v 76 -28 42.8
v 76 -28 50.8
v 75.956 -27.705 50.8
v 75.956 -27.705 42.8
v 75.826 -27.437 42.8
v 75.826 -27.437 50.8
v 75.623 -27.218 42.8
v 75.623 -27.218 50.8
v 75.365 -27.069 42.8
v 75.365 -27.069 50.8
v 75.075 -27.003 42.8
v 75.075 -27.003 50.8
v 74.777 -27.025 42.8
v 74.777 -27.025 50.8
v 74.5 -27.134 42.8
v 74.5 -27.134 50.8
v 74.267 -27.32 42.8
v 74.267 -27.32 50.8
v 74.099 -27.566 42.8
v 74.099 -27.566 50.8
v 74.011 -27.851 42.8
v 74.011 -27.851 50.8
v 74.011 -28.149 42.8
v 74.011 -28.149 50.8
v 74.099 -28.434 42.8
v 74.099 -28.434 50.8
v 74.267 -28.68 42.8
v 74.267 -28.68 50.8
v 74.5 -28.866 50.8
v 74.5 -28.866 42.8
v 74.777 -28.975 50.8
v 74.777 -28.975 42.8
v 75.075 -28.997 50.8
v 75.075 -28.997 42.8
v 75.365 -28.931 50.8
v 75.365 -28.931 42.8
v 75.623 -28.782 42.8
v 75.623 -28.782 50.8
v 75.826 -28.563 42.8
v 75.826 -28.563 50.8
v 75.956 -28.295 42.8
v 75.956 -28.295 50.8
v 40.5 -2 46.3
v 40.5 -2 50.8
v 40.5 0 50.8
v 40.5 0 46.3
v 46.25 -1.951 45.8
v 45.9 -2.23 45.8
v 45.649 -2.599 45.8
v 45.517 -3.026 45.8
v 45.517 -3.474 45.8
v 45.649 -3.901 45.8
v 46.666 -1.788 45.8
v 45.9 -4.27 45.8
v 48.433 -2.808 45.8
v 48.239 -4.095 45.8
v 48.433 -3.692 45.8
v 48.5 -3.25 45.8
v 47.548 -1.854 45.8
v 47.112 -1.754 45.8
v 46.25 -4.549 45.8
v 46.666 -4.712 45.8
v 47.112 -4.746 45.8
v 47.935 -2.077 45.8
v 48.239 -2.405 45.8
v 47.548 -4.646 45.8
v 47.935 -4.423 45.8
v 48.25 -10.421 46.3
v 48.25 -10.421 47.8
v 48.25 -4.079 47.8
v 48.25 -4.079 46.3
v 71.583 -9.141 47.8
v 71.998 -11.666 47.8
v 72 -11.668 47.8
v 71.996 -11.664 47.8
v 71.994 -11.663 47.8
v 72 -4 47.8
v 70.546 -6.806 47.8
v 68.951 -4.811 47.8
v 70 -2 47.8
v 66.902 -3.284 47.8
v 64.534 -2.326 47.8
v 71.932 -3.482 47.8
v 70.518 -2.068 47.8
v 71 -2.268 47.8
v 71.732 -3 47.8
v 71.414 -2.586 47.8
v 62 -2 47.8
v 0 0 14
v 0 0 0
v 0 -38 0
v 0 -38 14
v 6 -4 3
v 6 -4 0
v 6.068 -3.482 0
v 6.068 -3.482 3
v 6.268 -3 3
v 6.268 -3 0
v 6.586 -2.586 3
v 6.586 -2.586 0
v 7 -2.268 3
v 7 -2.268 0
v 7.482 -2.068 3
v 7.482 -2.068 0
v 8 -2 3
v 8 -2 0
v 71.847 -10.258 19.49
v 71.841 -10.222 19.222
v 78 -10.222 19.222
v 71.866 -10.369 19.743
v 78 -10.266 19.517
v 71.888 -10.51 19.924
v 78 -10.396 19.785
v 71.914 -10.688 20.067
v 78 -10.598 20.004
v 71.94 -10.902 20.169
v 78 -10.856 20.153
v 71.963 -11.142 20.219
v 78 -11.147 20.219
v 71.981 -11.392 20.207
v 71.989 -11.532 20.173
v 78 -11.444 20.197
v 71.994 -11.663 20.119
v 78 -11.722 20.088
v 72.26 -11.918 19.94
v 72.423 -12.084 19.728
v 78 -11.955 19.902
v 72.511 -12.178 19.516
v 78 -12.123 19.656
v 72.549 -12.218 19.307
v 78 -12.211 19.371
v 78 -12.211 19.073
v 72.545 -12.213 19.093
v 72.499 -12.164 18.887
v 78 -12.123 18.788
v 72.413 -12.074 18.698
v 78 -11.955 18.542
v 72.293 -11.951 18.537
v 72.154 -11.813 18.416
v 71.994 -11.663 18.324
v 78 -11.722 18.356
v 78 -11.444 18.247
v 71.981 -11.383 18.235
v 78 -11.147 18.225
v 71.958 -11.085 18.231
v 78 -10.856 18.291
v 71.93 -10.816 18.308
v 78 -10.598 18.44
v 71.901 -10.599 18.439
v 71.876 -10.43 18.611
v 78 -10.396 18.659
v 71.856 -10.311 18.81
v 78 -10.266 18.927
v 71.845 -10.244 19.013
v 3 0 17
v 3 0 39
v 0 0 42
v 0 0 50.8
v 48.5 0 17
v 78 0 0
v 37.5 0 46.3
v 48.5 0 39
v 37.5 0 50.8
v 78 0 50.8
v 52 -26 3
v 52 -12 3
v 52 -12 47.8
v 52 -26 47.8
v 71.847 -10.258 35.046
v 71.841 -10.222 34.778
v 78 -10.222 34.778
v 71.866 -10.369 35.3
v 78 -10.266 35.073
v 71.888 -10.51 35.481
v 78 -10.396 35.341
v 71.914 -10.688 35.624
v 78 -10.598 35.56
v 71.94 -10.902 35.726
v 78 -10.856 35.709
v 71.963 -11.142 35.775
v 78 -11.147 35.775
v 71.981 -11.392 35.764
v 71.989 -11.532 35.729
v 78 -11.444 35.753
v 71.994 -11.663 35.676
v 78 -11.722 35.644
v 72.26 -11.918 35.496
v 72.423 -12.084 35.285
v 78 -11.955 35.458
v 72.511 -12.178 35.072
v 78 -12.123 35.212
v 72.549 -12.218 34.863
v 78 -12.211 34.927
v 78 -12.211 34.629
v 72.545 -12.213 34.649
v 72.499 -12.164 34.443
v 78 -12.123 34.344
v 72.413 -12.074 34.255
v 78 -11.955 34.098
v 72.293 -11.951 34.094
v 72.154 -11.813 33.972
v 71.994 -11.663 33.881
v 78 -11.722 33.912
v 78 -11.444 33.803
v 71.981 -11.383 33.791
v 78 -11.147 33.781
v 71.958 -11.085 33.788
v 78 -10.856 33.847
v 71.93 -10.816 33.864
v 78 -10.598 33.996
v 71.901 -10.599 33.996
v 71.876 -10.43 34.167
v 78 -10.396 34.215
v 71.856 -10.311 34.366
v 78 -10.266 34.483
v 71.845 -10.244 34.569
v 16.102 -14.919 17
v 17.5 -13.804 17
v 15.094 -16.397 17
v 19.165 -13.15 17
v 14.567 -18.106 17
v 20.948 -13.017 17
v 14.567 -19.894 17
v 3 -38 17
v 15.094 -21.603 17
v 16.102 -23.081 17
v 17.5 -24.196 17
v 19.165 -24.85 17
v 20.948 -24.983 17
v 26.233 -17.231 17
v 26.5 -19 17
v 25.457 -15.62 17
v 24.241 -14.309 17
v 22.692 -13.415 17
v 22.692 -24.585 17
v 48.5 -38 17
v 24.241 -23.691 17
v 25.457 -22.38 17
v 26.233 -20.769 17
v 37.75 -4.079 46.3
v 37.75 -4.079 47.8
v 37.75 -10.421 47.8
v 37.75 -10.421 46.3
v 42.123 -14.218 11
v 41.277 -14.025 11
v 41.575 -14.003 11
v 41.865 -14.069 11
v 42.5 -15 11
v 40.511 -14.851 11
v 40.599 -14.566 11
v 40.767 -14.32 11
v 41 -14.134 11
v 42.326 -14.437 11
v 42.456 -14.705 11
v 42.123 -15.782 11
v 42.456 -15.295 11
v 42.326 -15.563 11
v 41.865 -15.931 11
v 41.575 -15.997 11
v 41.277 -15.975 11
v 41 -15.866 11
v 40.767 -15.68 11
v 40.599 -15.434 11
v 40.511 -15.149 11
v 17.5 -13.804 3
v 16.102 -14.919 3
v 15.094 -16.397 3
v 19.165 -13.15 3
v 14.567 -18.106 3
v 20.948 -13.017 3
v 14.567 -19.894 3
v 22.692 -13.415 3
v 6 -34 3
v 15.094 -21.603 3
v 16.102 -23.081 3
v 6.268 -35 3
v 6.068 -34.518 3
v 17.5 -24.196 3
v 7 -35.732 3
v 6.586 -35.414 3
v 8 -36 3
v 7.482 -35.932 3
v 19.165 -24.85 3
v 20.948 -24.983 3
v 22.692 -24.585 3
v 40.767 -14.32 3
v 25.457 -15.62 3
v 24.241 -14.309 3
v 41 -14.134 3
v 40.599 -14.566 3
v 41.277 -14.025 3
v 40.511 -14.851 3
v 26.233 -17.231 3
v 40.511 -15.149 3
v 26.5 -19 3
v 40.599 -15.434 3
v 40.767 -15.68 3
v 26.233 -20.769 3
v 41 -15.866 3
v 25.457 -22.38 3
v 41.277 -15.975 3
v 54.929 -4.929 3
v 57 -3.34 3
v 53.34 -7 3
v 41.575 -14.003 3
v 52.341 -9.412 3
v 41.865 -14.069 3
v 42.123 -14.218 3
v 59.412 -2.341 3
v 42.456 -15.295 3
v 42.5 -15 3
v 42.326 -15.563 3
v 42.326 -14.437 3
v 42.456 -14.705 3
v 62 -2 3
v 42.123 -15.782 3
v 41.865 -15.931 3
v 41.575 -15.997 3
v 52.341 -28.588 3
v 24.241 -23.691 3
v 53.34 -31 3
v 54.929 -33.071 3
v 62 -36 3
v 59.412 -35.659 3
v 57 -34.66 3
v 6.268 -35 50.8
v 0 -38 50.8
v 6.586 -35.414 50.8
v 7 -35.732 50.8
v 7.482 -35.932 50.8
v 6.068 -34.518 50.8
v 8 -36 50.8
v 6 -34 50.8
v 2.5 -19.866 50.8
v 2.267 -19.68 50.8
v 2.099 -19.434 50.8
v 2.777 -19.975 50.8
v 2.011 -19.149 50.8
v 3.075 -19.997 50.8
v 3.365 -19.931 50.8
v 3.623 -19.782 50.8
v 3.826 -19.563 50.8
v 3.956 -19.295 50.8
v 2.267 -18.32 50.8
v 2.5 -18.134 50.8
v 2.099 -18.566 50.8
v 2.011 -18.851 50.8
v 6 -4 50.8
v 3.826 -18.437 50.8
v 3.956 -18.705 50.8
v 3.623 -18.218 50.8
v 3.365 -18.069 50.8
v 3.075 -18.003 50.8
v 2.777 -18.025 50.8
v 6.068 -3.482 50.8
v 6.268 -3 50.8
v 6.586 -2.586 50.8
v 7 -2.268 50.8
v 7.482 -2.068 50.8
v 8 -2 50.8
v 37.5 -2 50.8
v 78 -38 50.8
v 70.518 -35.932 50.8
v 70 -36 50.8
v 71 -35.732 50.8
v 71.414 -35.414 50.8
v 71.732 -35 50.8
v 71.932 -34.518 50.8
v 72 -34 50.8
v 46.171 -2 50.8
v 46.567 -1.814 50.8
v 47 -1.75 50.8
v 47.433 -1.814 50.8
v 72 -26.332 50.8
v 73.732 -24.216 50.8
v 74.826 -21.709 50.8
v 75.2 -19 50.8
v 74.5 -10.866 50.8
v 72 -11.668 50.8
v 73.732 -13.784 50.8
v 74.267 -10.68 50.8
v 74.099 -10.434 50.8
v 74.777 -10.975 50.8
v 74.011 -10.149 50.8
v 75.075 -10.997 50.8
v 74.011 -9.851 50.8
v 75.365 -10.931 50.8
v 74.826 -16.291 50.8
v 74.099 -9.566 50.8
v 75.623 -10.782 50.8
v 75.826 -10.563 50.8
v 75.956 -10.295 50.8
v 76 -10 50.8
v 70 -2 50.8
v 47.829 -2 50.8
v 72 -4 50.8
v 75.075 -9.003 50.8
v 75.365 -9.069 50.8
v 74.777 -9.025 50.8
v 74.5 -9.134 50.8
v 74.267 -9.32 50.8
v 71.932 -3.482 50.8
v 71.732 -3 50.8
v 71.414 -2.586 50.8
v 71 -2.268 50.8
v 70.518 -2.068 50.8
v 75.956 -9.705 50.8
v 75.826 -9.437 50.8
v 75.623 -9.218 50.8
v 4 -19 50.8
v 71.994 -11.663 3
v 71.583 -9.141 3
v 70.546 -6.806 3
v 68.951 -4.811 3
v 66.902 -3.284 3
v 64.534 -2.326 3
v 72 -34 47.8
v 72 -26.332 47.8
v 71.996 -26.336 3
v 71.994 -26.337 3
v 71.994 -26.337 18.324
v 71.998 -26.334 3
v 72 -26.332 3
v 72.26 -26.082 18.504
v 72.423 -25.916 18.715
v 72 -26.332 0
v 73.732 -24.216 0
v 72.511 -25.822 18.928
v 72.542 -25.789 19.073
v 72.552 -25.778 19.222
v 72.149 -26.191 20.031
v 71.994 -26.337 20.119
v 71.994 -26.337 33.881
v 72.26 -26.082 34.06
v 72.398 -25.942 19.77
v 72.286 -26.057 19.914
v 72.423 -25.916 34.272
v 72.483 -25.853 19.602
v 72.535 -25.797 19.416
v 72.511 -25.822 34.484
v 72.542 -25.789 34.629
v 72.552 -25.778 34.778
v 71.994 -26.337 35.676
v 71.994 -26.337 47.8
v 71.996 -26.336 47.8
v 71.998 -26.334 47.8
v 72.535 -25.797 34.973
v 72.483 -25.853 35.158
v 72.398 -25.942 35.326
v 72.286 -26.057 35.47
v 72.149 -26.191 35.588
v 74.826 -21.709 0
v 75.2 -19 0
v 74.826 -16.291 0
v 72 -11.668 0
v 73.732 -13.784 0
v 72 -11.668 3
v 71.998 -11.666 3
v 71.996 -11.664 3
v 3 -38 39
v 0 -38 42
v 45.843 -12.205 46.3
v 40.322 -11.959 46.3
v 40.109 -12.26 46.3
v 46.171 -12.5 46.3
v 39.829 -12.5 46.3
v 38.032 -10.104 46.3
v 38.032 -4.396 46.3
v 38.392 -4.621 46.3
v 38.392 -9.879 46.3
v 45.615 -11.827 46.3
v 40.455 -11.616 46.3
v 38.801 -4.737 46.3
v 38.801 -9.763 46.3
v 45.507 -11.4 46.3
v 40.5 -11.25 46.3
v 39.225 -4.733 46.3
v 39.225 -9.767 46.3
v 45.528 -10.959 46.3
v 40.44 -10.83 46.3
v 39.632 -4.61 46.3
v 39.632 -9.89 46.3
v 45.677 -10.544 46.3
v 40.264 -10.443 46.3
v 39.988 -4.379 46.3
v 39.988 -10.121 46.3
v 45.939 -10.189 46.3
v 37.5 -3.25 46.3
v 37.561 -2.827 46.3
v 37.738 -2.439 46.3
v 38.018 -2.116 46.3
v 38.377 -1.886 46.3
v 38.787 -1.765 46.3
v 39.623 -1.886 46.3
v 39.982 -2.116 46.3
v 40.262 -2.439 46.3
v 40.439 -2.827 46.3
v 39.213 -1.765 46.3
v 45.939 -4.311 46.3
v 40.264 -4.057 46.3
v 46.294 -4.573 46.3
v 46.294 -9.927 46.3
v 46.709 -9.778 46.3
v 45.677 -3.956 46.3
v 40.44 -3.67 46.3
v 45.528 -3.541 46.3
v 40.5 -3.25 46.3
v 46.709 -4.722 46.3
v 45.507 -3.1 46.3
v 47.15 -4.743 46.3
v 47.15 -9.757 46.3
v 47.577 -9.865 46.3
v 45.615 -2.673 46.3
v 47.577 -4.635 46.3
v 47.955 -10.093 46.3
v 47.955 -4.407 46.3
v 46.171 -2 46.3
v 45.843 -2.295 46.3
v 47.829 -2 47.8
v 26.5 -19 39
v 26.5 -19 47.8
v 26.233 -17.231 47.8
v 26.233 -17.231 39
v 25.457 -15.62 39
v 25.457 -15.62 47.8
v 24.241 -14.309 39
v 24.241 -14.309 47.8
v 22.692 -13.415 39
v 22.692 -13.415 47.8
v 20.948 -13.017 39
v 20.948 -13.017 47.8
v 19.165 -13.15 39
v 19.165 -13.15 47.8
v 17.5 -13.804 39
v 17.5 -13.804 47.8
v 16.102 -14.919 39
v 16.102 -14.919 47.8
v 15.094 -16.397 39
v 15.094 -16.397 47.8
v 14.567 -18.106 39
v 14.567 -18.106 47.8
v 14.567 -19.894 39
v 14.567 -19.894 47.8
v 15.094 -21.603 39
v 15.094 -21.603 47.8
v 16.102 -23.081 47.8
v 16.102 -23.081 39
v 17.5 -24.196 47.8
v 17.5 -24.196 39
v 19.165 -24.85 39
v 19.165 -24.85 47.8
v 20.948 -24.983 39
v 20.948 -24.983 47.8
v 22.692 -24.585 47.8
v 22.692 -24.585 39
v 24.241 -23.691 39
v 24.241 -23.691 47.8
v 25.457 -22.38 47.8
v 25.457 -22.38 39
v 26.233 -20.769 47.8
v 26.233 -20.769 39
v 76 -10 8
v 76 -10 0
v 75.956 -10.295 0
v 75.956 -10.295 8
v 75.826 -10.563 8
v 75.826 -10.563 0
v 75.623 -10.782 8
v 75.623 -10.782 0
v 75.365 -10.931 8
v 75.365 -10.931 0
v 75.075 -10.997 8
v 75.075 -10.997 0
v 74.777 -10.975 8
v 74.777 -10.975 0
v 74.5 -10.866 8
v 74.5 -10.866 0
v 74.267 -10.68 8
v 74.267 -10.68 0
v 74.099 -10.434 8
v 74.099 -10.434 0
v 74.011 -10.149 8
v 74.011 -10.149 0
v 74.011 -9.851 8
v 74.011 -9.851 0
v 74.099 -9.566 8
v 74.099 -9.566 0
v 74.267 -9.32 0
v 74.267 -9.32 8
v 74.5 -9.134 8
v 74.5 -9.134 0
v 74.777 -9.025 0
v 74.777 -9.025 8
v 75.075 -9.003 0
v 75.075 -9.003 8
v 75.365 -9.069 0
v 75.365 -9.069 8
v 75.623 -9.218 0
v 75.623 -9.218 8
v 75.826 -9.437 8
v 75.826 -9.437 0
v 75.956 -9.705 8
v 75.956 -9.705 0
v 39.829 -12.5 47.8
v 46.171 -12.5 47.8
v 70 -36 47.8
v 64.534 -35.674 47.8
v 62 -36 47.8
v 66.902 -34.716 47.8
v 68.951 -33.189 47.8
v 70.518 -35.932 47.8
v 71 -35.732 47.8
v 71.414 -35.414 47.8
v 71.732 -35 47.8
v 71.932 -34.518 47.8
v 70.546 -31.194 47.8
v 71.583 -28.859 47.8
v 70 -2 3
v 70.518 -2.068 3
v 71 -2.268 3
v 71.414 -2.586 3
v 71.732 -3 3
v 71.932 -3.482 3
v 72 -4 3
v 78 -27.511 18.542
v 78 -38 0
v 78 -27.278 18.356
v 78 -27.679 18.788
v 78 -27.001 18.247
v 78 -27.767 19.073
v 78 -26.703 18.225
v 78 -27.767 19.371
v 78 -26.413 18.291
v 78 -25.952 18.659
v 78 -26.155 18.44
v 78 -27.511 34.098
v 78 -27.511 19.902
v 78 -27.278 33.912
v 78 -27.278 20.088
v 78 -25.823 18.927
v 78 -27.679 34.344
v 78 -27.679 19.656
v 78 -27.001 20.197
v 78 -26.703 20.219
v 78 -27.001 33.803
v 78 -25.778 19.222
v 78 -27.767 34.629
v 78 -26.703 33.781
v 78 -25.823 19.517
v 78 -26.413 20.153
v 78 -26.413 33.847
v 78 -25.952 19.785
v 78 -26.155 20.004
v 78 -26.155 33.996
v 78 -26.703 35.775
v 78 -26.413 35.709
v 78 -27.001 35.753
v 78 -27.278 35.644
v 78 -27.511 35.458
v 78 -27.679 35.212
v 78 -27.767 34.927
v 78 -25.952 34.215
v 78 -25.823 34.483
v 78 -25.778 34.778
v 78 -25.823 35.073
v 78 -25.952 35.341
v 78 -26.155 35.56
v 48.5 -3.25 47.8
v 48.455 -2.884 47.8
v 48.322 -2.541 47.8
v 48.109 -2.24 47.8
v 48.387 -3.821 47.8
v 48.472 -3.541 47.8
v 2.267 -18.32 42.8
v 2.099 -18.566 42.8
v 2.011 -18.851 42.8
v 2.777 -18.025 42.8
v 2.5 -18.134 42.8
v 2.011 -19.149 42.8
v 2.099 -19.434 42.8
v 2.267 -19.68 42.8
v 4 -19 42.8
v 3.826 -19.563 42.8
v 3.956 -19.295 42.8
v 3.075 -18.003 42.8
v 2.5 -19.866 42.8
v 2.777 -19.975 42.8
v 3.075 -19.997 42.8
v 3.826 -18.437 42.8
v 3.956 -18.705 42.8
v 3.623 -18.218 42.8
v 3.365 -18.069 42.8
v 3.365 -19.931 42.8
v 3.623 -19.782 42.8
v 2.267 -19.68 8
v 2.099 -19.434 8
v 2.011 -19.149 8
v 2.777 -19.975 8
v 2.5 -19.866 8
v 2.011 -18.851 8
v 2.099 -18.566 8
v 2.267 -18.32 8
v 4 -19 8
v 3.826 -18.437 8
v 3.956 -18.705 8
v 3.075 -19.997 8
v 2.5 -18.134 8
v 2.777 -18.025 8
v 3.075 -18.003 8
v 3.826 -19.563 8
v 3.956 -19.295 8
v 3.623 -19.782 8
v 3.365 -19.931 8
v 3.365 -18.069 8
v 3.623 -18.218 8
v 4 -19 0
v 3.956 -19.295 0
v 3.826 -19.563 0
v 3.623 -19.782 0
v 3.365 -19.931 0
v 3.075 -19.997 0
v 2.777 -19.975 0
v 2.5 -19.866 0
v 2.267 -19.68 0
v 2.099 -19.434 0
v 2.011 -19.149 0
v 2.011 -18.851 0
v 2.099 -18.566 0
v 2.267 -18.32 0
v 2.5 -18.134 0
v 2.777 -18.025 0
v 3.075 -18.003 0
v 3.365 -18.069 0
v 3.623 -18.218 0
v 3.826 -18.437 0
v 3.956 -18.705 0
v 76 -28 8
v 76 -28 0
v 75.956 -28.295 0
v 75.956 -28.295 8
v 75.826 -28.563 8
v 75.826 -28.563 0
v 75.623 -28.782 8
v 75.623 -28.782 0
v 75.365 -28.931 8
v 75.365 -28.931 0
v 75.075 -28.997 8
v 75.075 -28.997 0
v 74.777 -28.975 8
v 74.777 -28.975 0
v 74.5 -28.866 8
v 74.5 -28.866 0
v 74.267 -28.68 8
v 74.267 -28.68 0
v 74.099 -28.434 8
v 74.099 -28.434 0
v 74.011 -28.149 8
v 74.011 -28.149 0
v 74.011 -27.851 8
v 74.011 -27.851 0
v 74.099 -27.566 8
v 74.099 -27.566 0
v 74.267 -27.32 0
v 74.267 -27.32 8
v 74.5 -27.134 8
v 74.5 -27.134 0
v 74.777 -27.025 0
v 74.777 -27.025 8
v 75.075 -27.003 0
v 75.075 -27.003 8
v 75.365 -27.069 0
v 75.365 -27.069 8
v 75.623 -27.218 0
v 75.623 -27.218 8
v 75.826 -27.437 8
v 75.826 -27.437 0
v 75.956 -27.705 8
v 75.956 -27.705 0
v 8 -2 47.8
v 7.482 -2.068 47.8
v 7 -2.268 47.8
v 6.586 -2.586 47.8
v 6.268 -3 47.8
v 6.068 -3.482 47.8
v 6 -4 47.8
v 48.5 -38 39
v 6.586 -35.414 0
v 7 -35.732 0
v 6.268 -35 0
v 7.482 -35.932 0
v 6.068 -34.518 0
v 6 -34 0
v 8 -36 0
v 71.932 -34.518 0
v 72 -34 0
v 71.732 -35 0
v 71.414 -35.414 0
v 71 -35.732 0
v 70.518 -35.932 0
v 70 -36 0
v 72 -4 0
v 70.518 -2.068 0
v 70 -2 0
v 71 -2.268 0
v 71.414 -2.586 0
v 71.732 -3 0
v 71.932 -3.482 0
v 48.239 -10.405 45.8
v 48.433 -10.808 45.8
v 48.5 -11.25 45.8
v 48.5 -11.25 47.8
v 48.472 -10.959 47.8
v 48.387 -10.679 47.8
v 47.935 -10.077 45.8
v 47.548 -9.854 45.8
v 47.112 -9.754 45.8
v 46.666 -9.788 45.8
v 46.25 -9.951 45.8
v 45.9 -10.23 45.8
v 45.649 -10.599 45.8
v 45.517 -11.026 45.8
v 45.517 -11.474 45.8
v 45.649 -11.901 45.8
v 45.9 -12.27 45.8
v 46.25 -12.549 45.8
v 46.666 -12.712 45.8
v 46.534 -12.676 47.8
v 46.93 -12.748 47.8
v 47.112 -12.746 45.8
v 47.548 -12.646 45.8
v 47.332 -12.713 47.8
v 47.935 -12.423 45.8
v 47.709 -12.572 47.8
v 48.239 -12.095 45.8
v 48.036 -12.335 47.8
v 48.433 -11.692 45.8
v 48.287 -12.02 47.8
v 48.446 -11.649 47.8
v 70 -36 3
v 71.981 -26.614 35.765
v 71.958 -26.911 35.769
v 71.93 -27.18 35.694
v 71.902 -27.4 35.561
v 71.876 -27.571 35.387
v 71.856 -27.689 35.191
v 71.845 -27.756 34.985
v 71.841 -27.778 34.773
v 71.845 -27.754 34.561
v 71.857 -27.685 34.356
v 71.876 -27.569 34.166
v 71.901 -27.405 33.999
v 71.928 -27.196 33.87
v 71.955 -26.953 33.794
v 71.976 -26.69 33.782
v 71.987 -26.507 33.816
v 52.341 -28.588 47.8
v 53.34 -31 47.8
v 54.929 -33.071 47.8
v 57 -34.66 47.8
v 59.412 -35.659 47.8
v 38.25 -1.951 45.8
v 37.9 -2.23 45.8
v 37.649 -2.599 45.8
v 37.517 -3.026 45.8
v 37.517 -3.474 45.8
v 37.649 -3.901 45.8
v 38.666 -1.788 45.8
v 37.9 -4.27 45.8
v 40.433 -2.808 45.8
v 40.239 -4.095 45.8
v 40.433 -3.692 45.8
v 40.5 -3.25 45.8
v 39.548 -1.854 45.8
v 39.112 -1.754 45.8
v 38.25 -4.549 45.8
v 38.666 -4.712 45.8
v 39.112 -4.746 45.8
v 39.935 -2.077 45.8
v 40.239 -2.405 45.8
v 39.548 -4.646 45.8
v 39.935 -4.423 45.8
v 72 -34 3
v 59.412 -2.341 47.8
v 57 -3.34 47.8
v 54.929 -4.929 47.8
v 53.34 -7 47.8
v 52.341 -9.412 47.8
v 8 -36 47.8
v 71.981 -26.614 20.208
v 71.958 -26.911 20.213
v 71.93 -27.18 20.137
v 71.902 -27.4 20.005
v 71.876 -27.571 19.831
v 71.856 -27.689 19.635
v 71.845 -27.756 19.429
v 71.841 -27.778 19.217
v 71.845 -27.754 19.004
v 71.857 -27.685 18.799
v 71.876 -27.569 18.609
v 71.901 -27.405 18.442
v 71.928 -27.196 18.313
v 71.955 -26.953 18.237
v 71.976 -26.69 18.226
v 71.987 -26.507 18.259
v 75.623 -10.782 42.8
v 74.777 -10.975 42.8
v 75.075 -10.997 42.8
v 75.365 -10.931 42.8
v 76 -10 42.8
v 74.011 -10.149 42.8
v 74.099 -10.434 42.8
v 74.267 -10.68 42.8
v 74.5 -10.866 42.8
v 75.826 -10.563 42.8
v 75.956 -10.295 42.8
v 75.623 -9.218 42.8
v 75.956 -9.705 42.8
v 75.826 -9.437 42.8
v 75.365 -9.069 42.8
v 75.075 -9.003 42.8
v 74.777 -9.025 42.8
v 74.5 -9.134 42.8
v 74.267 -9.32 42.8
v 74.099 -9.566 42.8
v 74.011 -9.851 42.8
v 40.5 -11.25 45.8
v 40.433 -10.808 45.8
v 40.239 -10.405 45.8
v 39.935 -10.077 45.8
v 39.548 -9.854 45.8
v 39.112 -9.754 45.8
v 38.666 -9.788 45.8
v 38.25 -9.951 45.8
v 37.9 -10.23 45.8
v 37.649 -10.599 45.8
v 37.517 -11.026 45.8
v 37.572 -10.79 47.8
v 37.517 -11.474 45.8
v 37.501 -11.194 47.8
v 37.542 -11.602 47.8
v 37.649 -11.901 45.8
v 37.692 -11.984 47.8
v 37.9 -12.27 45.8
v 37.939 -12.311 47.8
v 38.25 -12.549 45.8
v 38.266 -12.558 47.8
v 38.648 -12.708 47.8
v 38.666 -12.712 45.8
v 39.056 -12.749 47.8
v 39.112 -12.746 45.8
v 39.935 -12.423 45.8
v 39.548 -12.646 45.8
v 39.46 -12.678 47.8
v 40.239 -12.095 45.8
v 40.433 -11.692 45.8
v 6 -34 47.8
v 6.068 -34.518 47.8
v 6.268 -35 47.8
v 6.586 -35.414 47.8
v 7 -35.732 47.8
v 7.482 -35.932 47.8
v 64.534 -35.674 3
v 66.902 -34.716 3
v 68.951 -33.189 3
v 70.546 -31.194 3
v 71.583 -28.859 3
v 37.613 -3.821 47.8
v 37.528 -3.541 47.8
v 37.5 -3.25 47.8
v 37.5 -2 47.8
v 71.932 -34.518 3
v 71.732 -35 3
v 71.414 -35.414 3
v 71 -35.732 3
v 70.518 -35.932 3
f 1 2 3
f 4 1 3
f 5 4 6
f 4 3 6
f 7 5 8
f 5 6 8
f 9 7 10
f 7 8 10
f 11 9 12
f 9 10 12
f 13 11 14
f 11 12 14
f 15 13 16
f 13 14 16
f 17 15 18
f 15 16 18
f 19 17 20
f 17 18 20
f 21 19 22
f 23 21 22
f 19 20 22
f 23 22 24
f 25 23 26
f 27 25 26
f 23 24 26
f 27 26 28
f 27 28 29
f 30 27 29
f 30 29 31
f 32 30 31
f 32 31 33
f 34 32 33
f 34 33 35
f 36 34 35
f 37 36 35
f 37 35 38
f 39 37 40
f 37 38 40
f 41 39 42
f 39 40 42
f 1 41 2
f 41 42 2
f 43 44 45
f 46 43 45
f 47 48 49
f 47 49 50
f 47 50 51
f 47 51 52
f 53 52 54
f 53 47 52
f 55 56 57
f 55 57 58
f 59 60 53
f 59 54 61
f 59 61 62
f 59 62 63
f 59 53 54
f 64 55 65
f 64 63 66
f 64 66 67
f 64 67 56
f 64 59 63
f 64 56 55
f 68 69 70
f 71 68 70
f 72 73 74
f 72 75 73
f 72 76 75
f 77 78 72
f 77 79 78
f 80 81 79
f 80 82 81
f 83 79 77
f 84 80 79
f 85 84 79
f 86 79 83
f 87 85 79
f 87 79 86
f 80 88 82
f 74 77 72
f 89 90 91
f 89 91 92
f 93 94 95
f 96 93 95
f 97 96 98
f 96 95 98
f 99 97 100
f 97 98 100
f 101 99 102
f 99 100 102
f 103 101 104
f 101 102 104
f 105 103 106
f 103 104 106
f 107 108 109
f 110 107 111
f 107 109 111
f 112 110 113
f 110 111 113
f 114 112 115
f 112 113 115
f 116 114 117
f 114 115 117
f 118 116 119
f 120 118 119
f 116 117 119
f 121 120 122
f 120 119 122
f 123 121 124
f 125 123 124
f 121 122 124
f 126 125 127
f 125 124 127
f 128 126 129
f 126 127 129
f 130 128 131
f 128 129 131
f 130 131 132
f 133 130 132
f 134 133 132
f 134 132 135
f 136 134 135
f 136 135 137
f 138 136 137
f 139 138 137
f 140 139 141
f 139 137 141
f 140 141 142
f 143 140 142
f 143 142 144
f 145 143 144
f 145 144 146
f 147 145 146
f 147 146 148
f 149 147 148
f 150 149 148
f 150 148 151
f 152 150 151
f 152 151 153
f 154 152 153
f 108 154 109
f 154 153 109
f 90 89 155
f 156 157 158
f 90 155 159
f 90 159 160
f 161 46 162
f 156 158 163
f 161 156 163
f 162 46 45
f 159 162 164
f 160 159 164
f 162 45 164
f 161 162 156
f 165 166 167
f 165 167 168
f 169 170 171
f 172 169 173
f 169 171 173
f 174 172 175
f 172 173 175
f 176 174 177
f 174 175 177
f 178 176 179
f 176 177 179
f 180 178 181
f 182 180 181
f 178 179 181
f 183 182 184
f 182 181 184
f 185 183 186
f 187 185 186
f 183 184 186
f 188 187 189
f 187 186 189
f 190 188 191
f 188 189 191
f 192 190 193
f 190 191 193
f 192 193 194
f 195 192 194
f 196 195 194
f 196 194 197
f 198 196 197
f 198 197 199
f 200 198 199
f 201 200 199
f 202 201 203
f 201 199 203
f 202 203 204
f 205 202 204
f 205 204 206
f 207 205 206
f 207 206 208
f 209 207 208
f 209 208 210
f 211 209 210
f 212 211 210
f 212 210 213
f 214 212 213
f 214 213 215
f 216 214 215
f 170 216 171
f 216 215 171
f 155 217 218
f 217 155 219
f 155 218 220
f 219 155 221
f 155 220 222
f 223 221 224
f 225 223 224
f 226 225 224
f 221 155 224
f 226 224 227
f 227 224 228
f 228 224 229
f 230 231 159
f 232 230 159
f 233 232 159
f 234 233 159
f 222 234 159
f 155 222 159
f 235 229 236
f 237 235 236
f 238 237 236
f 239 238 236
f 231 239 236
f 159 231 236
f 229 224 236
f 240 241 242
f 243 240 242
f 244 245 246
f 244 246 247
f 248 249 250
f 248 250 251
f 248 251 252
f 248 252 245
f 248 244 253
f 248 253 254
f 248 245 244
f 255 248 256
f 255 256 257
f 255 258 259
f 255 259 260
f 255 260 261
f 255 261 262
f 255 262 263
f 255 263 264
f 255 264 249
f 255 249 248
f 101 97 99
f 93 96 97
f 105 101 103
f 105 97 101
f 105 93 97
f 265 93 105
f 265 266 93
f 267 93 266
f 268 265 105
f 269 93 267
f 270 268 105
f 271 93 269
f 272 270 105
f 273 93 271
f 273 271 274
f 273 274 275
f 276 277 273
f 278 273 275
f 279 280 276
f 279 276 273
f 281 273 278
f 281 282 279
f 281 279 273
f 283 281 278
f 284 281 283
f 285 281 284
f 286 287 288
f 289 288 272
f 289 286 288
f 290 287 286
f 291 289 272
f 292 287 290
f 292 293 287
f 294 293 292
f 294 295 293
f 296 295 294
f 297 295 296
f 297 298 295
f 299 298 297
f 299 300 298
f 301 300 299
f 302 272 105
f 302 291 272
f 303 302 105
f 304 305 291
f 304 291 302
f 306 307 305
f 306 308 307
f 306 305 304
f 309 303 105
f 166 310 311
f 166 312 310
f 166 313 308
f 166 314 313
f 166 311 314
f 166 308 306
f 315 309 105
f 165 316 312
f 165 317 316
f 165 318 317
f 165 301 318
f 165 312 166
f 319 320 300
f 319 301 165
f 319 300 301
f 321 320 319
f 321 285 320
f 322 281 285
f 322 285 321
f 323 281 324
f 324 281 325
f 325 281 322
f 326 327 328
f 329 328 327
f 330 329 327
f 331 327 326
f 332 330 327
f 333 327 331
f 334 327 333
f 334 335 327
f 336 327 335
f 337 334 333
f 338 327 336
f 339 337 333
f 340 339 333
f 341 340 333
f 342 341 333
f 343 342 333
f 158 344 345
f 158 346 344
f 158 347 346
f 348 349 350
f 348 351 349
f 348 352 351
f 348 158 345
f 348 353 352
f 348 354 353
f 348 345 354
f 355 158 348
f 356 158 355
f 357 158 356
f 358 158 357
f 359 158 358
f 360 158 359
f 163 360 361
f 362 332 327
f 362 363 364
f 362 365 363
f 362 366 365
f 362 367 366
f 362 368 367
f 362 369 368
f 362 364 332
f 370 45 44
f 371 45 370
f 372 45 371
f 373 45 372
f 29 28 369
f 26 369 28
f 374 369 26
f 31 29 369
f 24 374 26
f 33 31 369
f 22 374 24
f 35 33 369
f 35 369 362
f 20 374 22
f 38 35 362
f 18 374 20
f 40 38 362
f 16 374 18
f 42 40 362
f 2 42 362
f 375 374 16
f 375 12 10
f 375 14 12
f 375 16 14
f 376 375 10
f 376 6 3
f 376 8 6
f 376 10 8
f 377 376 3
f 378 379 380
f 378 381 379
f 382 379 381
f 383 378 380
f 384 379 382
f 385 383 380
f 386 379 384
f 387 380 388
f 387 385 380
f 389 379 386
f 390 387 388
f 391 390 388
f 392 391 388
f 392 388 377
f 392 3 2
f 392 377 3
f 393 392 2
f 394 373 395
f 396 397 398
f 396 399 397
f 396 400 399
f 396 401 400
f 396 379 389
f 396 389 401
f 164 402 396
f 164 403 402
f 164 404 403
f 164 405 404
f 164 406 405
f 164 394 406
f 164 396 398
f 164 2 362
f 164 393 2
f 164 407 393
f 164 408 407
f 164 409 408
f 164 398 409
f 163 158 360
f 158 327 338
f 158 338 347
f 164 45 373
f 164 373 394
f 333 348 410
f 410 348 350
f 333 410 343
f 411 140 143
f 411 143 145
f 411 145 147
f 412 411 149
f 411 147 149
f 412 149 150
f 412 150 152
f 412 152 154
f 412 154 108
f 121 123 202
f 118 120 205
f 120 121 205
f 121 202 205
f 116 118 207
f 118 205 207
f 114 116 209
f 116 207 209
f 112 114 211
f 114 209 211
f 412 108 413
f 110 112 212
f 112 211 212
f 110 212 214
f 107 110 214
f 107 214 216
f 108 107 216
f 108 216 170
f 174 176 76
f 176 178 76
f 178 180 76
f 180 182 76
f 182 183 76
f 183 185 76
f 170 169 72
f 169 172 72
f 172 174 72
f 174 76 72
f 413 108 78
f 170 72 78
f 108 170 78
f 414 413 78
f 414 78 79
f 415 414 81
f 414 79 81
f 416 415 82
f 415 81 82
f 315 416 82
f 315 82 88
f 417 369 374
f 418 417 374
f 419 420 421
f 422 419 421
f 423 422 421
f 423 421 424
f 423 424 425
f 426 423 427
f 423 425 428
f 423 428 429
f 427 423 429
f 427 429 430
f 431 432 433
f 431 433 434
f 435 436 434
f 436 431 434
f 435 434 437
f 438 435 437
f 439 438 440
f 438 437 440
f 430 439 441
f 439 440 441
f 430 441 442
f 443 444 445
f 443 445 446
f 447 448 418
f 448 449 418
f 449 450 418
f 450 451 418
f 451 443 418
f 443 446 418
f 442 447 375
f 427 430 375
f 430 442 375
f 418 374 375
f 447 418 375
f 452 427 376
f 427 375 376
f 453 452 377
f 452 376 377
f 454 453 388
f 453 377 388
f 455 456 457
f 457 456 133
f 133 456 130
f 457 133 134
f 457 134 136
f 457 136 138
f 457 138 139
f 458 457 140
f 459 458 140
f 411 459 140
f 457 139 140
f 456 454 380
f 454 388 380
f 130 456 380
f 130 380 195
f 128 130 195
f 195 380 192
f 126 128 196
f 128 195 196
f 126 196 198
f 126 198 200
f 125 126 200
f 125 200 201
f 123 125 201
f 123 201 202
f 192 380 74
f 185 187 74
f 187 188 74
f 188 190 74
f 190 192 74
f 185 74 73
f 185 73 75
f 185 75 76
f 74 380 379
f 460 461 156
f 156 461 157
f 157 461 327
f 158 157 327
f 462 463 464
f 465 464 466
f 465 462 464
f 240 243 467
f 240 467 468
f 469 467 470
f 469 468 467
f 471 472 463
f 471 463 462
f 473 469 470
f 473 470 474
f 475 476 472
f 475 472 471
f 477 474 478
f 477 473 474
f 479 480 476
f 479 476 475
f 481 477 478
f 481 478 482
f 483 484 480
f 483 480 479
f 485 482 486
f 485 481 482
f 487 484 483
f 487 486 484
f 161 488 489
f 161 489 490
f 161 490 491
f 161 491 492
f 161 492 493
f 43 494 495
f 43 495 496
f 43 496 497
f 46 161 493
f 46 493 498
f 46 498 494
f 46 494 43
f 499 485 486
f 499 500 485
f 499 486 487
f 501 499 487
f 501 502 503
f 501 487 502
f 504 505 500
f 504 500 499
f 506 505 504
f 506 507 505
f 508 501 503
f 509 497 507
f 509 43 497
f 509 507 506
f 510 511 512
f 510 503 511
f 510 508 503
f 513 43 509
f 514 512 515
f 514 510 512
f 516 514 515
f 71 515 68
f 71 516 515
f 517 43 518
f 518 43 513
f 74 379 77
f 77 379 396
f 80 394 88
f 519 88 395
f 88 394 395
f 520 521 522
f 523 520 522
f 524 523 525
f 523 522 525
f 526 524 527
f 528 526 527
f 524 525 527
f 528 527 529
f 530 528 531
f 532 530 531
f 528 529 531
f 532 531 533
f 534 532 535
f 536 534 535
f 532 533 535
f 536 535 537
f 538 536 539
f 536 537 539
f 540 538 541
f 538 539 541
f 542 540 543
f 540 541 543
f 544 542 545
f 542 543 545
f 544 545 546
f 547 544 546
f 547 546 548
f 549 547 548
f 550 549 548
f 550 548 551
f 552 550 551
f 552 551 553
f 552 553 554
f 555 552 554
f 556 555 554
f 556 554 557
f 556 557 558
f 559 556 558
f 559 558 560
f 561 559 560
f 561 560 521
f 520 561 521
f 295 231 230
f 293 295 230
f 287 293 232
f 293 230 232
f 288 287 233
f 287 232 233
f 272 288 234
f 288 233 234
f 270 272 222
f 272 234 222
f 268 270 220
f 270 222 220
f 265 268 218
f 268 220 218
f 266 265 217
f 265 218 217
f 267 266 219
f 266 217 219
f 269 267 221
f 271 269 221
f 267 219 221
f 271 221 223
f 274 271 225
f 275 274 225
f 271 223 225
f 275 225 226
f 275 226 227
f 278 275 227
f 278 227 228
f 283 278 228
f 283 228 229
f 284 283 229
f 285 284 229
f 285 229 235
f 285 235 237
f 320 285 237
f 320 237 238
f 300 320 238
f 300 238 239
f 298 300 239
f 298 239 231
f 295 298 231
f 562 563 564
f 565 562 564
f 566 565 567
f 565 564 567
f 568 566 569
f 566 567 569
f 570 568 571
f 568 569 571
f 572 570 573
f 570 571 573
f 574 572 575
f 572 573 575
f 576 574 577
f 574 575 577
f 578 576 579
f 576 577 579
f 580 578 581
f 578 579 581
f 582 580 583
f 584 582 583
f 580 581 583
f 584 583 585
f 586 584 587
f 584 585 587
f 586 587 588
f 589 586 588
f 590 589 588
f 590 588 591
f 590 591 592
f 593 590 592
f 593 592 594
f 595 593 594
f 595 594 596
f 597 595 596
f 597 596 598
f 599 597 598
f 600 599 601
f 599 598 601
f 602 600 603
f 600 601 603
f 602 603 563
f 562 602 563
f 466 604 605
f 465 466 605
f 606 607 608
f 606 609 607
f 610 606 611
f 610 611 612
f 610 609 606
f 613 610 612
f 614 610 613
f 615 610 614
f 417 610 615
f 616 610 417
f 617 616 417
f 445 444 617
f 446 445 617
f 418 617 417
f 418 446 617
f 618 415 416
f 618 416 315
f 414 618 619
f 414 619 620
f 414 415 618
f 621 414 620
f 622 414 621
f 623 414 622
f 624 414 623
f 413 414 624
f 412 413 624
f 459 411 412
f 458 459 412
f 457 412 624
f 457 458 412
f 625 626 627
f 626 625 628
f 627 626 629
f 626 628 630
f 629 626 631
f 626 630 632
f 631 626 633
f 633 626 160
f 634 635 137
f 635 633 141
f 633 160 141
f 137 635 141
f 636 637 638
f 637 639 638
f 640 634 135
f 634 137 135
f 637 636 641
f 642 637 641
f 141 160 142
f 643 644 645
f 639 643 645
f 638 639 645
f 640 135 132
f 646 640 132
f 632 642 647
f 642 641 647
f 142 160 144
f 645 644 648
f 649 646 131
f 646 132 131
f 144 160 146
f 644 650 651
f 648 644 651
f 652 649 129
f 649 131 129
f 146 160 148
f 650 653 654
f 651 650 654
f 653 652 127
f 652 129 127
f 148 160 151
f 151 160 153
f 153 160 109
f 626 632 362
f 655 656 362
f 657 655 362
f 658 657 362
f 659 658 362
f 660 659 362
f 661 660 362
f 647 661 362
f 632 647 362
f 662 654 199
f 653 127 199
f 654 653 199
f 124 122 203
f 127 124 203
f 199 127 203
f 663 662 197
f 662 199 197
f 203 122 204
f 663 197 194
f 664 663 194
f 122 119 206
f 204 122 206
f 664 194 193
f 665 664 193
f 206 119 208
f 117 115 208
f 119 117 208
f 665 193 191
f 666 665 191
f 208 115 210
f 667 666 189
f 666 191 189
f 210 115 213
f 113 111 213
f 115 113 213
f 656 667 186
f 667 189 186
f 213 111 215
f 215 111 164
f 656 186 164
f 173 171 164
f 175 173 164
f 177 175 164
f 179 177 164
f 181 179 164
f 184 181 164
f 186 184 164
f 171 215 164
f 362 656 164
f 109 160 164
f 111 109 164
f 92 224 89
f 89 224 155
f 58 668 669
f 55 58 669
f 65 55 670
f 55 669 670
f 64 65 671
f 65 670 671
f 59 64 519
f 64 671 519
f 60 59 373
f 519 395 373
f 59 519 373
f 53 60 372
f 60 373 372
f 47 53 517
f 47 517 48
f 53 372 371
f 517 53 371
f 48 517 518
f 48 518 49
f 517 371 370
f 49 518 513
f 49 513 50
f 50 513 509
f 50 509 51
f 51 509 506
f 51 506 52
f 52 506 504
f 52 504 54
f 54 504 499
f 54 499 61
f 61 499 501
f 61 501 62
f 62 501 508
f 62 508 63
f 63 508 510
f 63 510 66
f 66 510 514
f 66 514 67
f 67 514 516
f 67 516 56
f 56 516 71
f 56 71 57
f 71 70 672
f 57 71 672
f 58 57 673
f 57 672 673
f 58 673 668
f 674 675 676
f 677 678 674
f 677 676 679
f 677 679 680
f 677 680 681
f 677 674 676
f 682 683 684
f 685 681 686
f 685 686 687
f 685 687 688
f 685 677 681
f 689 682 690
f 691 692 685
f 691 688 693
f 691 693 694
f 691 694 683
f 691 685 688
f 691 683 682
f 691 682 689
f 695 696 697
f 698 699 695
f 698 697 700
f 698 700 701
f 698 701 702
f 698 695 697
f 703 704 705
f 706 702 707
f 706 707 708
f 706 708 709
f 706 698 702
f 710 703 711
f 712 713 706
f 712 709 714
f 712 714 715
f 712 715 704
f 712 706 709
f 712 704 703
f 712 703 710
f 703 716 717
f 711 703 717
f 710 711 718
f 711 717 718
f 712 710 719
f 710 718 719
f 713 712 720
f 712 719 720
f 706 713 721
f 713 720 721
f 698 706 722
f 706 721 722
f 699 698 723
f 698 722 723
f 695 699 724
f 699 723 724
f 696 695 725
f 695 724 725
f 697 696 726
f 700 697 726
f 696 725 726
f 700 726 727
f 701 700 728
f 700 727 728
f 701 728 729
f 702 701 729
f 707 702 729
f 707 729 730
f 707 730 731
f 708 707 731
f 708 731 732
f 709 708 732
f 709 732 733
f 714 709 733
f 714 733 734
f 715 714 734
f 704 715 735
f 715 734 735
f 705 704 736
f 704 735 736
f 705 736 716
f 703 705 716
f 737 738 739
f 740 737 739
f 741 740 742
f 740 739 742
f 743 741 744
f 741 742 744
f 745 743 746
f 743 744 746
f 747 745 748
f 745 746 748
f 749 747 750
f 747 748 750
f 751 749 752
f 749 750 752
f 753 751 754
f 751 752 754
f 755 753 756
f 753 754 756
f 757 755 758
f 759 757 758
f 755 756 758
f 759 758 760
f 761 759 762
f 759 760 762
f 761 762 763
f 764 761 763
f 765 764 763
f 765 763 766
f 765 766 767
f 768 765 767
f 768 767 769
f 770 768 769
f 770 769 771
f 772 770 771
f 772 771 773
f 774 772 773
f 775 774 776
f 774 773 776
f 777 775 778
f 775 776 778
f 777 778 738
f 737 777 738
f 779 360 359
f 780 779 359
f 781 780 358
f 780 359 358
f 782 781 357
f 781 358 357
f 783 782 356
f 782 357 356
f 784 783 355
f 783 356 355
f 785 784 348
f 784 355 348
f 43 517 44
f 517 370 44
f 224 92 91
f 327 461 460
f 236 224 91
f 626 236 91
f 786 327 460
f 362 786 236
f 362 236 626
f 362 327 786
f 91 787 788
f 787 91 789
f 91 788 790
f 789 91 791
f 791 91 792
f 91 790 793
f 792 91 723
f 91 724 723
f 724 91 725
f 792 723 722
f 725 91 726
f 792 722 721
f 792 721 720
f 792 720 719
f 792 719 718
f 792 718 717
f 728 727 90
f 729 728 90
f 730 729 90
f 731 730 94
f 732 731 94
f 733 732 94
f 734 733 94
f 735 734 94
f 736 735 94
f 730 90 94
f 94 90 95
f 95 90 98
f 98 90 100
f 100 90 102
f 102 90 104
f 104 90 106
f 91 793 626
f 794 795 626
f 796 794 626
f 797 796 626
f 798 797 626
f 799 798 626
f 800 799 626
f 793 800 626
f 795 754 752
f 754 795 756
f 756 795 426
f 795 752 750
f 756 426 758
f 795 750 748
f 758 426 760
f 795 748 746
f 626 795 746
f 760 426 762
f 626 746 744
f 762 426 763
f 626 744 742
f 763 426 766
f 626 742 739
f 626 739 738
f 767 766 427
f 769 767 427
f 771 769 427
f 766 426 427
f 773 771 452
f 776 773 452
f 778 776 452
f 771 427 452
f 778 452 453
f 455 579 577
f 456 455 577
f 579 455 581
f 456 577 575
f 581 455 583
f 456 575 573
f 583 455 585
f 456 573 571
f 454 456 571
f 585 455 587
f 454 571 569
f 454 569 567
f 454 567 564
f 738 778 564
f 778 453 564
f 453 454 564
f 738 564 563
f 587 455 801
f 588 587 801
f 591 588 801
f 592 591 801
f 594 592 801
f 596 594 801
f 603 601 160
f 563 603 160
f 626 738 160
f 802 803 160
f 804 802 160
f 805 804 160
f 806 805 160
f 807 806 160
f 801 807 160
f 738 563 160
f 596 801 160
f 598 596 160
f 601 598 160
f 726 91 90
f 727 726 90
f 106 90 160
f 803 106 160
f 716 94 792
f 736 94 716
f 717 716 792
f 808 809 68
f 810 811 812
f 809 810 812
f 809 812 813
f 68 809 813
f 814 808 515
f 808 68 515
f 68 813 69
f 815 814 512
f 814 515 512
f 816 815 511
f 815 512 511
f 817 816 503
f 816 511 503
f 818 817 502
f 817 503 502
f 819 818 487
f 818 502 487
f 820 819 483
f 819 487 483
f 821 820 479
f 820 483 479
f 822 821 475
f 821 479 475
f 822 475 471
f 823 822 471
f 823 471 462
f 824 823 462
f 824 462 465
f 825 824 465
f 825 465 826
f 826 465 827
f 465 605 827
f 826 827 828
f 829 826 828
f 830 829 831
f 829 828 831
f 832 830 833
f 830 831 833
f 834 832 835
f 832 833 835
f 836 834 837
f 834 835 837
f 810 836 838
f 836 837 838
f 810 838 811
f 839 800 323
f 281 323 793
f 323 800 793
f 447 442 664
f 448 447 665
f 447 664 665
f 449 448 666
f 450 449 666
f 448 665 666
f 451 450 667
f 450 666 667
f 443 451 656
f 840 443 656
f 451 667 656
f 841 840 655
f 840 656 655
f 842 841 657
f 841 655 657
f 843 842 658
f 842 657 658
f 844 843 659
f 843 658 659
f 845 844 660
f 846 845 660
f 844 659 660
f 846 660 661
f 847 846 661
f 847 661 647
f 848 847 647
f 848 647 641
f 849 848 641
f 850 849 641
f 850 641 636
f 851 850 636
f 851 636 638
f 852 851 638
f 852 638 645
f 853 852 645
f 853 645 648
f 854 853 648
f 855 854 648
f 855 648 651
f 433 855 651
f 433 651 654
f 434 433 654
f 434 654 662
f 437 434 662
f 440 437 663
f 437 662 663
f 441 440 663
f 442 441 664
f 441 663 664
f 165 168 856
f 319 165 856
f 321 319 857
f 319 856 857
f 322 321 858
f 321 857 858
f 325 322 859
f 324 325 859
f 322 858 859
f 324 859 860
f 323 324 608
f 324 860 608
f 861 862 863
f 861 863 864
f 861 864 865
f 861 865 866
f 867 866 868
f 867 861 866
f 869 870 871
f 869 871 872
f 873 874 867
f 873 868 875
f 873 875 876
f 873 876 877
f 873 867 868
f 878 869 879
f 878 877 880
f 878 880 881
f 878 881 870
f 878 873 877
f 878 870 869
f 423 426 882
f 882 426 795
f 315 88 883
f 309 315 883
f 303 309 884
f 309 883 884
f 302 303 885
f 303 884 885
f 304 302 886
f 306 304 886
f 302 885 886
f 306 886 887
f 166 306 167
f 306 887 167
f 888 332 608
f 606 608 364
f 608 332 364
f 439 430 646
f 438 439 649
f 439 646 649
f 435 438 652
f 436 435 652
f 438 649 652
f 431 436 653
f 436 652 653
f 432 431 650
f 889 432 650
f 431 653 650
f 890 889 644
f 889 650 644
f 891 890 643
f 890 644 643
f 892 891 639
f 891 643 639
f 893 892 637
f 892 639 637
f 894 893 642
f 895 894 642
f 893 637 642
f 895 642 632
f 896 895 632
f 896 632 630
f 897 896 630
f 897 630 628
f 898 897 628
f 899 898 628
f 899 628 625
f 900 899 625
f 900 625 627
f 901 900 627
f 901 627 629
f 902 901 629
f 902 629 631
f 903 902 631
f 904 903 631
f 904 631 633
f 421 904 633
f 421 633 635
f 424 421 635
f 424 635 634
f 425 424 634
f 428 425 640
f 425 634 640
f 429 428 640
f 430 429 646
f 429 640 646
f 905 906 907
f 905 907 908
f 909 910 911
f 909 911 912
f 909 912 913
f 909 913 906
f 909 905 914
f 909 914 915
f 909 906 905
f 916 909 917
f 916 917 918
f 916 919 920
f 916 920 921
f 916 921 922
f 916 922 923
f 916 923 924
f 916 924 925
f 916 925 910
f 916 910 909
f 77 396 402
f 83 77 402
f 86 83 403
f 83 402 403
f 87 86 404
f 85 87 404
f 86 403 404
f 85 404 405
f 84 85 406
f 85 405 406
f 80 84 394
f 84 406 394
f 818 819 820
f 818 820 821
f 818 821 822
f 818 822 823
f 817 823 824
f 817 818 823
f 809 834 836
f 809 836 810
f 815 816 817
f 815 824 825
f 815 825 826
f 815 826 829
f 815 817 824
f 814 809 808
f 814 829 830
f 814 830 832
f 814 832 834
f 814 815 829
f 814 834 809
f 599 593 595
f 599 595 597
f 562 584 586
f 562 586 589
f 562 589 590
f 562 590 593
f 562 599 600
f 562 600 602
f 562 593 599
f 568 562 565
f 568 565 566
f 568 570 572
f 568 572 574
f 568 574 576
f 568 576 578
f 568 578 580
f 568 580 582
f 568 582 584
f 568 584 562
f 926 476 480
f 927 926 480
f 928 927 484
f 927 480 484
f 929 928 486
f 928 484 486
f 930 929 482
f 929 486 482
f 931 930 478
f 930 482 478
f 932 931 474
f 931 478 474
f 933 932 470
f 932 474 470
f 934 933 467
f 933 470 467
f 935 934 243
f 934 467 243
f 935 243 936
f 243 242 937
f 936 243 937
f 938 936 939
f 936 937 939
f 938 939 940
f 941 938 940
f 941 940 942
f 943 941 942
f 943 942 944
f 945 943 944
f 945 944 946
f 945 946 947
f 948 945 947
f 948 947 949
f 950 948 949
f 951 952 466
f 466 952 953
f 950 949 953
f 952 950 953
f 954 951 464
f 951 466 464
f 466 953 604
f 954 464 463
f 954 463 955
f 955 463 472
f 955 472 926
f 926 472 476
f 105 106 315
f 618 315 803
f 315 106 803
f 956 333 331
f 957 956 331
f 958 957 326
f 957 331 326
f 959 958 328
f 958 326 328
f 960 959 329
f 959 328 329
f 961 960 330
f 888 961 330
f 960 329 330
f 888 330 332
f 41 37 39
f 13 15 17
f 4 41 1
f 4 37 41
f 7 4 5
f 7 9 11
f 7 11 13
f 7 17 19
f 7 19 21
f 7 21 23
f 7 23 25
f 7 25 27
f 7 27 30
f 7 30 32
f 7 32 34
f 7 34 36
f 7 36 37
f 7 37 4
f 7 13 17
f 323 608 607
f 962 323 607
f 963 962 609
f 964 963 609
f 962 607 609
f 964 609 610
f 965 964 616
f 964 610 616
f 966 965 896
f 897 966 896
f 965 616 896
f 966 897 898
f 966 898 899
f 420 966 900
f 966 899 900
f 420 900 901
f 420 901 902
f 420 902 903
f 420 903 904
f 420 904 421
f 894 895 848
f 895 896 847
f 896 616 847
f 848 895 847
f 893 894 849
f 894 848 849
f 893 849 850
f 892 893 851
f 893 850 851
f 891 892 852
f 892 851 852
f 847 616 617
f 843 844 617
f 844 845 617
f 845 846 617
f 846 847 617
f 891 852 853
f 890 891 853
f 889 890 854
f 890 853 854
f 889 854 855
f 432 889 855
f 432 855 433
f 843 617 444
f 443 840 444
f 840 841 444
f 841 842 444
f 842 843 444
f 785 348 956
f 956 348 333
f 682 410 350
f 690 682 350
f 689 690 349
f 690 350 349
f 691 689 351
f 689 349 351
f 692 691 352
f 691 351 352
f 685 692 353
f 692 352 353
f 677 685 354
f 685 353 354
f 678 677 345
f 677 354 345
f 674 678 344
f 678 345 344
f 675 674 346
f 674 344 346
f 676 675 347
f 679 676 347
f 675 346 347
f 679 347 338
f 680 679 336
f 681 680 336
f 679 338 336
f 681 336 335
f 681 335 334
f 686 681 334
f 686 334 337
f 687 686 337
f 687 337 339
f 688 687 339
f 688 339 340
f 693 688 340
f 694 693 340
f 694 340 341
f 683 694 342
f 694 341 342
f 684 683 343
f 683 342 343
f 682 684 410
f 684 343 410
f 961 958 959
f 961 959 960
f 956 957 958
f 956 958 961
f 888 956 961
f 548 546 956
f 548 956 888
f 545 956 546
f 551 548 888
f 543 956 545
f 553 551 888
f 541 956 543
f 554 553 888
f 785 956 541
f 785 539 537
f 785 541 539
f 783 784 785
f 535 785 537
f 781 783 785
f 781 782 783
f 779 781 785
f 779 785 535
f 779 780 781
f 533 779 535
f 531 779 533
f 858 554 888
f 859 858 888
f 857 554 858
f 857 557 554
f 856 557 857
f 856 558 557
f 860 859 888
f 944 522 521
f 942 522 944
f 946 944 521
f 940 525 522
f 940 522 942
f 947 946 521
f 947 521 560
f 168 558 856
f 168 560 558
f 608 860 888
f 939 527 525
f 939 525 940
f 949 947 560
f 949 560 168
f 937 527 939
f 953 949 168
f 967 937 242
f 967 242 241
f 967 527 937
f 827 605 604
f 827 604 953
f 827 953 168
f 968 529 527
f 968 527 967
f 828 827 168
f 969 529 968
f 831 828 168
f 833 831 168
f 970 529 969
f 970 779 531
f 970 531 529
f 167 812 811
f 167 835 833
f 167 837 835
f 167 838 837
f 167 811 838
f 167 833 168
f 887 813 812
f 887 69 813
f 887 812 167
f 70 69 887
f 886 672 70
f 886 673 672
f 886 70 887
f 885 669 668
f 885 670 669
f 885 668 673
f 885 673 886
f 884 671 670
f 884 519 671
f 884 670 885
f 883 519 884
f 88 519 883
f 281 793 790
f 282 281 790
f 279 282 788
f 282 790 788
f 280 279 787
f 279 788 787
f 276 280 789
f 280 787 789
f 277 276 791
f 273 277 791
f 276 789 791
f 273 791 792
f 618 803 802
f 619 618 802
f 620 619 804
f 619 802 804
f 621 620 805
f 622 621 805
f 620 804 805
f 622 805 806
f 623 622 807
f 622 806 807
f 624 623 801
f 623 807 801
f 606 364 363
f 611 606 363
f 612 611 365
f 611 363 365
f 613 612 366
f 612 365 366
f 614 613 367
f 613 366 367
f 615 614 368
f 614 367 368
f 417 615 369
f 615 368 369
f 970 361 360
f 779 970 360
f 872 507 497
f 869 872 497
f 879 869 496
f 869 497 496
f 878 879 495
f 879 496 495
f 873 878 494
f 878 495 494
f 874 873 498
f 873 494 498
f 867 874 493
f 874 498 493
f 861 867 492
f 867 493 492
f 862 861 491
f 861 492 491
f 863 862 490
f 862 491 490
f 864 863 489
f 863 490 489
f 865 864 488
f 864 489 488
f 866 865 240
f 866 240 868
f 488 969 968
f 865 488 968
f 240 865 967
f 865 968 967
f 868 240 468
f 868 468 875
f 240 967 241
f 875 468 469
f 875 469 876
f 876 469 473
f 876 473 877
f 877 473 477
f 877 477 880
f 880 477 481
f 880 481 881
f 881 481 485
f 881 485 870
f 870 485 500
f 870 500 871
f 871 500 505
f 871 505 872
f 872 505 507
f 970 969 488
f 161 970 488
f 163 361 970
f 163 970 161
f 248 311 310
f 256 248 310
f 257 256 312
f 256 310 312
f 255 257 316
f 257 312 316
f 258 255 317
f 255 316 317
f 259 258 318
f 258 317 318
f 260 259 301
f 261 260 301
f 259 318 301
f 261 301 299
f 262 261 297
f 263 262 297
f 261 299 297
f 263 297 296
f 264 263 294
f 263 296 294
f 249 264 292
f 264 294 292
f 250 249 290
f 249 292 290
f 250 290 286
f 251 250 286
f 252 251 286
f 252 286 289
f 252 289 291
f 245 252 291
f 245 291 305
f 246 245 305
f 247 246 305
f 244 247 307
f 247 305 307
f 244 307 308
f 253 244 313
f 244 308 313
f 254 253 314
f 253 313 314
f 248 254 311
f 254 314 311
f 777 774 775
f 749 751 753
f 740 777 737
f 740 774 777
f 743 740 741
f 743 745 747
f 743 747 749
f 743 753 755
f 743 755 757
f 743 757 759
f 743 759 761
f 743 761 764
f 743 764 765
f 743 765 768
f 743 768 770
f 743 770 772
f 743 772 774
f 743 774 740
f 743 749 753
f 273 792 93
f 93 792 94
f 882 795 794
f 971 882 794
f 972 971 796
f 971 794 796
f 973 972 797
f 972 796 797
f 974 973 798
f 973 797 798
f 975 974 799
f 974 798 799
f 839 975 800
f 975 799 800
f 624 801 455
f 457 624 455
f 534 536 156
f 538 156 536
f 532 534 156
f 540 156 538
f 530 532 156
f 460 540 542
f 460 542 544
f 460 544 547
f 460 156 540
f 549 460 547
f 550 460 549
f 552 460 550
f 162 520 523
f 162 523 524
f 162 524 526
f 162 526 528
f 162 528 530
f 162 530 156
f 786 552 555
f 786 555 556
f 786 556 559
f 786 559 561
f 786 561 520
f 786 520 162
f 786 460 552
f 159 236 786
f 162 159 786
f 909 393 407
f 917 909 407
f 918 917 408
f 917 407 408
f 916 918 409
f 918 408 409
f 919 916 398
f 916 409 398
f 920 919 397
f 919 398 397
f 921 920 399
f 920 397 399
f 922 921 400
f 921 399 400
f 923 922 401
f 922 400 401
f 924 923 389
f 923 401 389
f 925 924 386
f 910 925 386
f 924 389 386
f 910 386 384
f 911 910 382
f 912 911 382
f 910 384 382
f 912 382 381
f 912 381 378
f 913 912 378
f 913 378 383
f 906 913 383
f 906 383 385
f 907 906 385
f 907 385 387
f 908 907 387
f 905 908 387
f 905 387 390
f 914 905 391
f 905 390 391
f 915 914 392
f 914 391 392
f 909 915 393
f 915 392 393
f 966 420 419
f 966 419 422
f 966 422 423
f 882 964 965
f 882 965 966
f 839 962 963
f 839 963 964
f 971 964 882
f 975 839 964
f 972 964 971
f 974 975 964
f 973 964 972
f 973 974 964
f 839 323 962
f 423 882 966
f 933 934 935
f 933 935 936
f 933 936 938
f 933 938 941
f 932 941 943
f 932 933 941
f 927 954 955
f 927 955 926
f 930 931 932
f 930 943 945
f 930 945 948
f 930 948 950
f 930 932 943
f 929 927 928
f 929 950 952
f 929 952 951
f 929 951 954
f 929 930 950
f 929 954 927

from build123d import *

# Parameters (mm, degrees)
F0_W      = 78
F0_H      = 50.8
F1_DEPTH  = 38
F3_DEPTH  = 3
F5_DEPTH  = 50.8
F7_DEPTH  = 4.5
F8_R      = 1.5
F9_DEPTH  = 5
F10_W     = 3
F10_H     = 3.25
F11_DEPTH = 4.5
F12_R     = 6
F13_DEPTH = 51
F15_DEPTH = 3
F16_W     = 48.5
F16_H     = 22
F17_DEPTH = 38
F18_SIZE  = 3
F19_R     = 1
F20_DEPTH = 8
F21_R     = 1
F22_DEPTH = 8
F23_R     = 1
F24_DEPTH = 8
F25_R     = 1
F26_DEPTH = 10


with BuildPart() as f1:
    # F0 (on Front) → F1 (new body)
    with BuildSketch(Plane.XZ):
        with Locations((39, 25.4)):
            Rectangle(F0_W, F0_H)
    extrude(amount=F1_DEPTH)

    # F2 (on face) → F3 (cut)
    with BuildSketch(Plane.XY.offset(50.8)):
        with BuildLine():
            Line((70, -2), (8, -2))
            ThreePointArc((8, -2), (6.5857864376, -2.5857864376), (6, -4))
            Line((6, -4), (6, -34))
            ThreePointArc((6, -34), (6.5857864376, -35.4142135624), (8, -36))
            Line((8, -36), (70, -36))
            ThreePointArc((70, -36), (71.4142135624, -35.4142135624), (72, -34))
            Line((72, -34), (72, -4))
            ThreePointArc((72, -4), (71.4142135624, -2.5857864376), (70, -2))
        make_face()
    extrude(amount=-F3_DEPTH, mode=Mode.SUBTRACT)

    # F4 (on face) → F5 (cut, through all)
    with BuildSketch(Plane.XY.offset(50.8)):
        with BuildLine():
            ThreePointArc((62, -2), (54.9289321881, -4.9289321881), (52, -12))
            Line((52, -12), (52, -26))
            ThreePointArc((52, -26), (54.9289321881, -33.0710678119), (62, -36))
            ThreePointArc((62, -36), (68.9507563357, -33.1893662003), (71.9943065333, -26.3373972723))
            ThreePointArc((71.9943065333, -26.3373972723), (75.2, -19), (71.9943065333, -11.6626027277))
            ThreePointArc((71.9943065333, -11.6626027277), (68.9507563357, -4.8106337997), (62, -2))
        make_face()
    extrude(amount=-F5_DEPTH, mode=Mode.SUBTRACT)

    # F6 (on face) → F7 (cut)
    with BuildSketch(Plane.XY.offset(50.8)):
        with BuildLine():
            Line((47.25, -2), (38.75, -2))
            ThreePointArc((38.75, -2), (38.0428932188, -2.2928932188), (37.75, -3))
            Line((37.75, -3), (37.75, -11.5))
            ThreePointArc((37.75, -11.5), (38.0428932188, -12.2071067812), (38.75, -12.5))
            Line((38.75, -12.5), (47.25, -12.5))
            ThreePointArc((47.25, -12.5), (47.9571067812, -12.2071067812), (48.25, -11.5))
            Line((48.25, -11.5), (48.25, -3))
            ThreePointArc((48.25, -3), (47.9571067812, -2.2928932188), (47.25, -2))
        make_face()
    extrude(amount=-F7_DEPTH, mode=Mode.SUBTRACT)

    # F8 (on face) → F9 (cut)
    with BuildSketch(Plane.XY.offset(50.8)):
        with Locations((47, -11.25)):
            Circle(F8_R)
        with Locations((39, -11.25)):
            Circle(F8_R)
        with Locations((39, -3.25)):
            Circle(F8_R)
        with Locations((47, -3.25)):
            Circle(F8_R)
    extrude(amount=-F9_DEPTH, mode=Mode.SUBTRACT)

    # F10 (on face) → F11 (cut)
    with BuildSketch(Plane.XY.offset(50.8)):
        with Locations((39, -1.625)):
            Rectangle(F10_W, F10_H)
    extrude(amount=-F11_DEPTH, mode=Mode.SUBTRACT)

    # F12 (on face) → F13 (cut)
    with BuildSketch(Plane.XY.offset(50.8)):
        with Locations((20.5, -19)):
            Circle(F12_R)
    extrude(amount=-F13_DEPTH, mode=Mode.SUBTRACT)

    # F14 (on face) → F15 (cut)
    with BuildSketch(Plane(origin=(0, 0, 0), x_dir=(1, 0, 0), z_dir=(0, 0, -1))):
        with BuildLine():
            Line((70, 36), (8, 36))
            ThreePointArc((8, 36), (6.5857864376, 35.4142135624), (6, 34))
            Line((6, 34), (6, 4))
            ThreePointArc((6, 4), (6.5857864376, 2.5857864376), (8, 2))
            Line((8, 2), (70, 2))
            ThreePointArc((70, 2), (71.4142135624, 2.5857864376), (72, 4))
            Line((72, 4), (72, 34))
            ThreePointArc((72, 34), (71.4142135624, 35.4142135624), (70, 36))
        make_face()
    extrude(amount=-F15_DEPTH, mode=Mode.SUBTRACT)

    # F16 (on face) → F17 (cut, through all)
    with BuildSketch(Plane.XZ.offset(38)):
        with Locations((24.25, 28)):
            Rectangle(F16_W, F16_H)
    extrude(amount=-F17_DEPTH, mode=Mode.SUBTRACT)

    # F18
    f18_edges = [f1.edges().sort_by_distance(p)[0] for p in [
        (0, -19, 39),
        (0, -19, 17),
    ]]
    chamfer(f18_edges, length=F18_SIZE)

    # F19 (on face) → F20 (cut)
    with BuildSketch(Plane.XY.offset(50.8)):
        with Locations((3, -19)):
            Circle(F19_R)
        with Locations((75, -10)):
            Circle(F19_R)
        with Locations((75, -28)):
            Circle(F19_R)
    extrude(amount=-F20_DEPTH, mode=Mode.SUBTRACT)

    # F21 (on face) → F22 (cut)
    with BuildSketch(Plane(origin=(0, 0, 0), x_dir=(1, 0, 0), z_dir=(0, 0, -1))):
        with Locations((75, 28)):
            Circle(F21_R)
        with Locations((75, 10)):
            Circle(F21_R)
        with Locations((3, 19)):
            Circle(F21_R)
    extrude(amount=-F22_DEPTH, mode=Mode.SUBTRACT)

    # F23 (on face) → F24 (cut)
    with BuildSketch(Plane(origin=(0, 0, 3), x_dir=(1, 0, 0), z_dir=(0, 0, -1))):
        with Locations((41.5, 15)):
            Circle(F23_R)
    extrude(amount=-F24_DEPTH, mode=Mode.SUBTRACT)

    # F25 (on face) → F26 (cut)
    with BuildSketch(Plane.YZ.offset(78)):
        with Locations((-26.7781745931, 34.7781745931)):
            Circle(F25_R)
        with Locations((-11.2218254069, 34.7781745931)):
            Circle(F25_R)
        with Locations((-26.7781745931, 19.2218254069)):
            Circle(F25_R)
        with Locations((-11.2218254069, 19.2218254069)):
            Circle(F25_R)
    extrude(amount=-F26_DEPTH, mode=Mode.SUBTRACT)


solid = f1.part
